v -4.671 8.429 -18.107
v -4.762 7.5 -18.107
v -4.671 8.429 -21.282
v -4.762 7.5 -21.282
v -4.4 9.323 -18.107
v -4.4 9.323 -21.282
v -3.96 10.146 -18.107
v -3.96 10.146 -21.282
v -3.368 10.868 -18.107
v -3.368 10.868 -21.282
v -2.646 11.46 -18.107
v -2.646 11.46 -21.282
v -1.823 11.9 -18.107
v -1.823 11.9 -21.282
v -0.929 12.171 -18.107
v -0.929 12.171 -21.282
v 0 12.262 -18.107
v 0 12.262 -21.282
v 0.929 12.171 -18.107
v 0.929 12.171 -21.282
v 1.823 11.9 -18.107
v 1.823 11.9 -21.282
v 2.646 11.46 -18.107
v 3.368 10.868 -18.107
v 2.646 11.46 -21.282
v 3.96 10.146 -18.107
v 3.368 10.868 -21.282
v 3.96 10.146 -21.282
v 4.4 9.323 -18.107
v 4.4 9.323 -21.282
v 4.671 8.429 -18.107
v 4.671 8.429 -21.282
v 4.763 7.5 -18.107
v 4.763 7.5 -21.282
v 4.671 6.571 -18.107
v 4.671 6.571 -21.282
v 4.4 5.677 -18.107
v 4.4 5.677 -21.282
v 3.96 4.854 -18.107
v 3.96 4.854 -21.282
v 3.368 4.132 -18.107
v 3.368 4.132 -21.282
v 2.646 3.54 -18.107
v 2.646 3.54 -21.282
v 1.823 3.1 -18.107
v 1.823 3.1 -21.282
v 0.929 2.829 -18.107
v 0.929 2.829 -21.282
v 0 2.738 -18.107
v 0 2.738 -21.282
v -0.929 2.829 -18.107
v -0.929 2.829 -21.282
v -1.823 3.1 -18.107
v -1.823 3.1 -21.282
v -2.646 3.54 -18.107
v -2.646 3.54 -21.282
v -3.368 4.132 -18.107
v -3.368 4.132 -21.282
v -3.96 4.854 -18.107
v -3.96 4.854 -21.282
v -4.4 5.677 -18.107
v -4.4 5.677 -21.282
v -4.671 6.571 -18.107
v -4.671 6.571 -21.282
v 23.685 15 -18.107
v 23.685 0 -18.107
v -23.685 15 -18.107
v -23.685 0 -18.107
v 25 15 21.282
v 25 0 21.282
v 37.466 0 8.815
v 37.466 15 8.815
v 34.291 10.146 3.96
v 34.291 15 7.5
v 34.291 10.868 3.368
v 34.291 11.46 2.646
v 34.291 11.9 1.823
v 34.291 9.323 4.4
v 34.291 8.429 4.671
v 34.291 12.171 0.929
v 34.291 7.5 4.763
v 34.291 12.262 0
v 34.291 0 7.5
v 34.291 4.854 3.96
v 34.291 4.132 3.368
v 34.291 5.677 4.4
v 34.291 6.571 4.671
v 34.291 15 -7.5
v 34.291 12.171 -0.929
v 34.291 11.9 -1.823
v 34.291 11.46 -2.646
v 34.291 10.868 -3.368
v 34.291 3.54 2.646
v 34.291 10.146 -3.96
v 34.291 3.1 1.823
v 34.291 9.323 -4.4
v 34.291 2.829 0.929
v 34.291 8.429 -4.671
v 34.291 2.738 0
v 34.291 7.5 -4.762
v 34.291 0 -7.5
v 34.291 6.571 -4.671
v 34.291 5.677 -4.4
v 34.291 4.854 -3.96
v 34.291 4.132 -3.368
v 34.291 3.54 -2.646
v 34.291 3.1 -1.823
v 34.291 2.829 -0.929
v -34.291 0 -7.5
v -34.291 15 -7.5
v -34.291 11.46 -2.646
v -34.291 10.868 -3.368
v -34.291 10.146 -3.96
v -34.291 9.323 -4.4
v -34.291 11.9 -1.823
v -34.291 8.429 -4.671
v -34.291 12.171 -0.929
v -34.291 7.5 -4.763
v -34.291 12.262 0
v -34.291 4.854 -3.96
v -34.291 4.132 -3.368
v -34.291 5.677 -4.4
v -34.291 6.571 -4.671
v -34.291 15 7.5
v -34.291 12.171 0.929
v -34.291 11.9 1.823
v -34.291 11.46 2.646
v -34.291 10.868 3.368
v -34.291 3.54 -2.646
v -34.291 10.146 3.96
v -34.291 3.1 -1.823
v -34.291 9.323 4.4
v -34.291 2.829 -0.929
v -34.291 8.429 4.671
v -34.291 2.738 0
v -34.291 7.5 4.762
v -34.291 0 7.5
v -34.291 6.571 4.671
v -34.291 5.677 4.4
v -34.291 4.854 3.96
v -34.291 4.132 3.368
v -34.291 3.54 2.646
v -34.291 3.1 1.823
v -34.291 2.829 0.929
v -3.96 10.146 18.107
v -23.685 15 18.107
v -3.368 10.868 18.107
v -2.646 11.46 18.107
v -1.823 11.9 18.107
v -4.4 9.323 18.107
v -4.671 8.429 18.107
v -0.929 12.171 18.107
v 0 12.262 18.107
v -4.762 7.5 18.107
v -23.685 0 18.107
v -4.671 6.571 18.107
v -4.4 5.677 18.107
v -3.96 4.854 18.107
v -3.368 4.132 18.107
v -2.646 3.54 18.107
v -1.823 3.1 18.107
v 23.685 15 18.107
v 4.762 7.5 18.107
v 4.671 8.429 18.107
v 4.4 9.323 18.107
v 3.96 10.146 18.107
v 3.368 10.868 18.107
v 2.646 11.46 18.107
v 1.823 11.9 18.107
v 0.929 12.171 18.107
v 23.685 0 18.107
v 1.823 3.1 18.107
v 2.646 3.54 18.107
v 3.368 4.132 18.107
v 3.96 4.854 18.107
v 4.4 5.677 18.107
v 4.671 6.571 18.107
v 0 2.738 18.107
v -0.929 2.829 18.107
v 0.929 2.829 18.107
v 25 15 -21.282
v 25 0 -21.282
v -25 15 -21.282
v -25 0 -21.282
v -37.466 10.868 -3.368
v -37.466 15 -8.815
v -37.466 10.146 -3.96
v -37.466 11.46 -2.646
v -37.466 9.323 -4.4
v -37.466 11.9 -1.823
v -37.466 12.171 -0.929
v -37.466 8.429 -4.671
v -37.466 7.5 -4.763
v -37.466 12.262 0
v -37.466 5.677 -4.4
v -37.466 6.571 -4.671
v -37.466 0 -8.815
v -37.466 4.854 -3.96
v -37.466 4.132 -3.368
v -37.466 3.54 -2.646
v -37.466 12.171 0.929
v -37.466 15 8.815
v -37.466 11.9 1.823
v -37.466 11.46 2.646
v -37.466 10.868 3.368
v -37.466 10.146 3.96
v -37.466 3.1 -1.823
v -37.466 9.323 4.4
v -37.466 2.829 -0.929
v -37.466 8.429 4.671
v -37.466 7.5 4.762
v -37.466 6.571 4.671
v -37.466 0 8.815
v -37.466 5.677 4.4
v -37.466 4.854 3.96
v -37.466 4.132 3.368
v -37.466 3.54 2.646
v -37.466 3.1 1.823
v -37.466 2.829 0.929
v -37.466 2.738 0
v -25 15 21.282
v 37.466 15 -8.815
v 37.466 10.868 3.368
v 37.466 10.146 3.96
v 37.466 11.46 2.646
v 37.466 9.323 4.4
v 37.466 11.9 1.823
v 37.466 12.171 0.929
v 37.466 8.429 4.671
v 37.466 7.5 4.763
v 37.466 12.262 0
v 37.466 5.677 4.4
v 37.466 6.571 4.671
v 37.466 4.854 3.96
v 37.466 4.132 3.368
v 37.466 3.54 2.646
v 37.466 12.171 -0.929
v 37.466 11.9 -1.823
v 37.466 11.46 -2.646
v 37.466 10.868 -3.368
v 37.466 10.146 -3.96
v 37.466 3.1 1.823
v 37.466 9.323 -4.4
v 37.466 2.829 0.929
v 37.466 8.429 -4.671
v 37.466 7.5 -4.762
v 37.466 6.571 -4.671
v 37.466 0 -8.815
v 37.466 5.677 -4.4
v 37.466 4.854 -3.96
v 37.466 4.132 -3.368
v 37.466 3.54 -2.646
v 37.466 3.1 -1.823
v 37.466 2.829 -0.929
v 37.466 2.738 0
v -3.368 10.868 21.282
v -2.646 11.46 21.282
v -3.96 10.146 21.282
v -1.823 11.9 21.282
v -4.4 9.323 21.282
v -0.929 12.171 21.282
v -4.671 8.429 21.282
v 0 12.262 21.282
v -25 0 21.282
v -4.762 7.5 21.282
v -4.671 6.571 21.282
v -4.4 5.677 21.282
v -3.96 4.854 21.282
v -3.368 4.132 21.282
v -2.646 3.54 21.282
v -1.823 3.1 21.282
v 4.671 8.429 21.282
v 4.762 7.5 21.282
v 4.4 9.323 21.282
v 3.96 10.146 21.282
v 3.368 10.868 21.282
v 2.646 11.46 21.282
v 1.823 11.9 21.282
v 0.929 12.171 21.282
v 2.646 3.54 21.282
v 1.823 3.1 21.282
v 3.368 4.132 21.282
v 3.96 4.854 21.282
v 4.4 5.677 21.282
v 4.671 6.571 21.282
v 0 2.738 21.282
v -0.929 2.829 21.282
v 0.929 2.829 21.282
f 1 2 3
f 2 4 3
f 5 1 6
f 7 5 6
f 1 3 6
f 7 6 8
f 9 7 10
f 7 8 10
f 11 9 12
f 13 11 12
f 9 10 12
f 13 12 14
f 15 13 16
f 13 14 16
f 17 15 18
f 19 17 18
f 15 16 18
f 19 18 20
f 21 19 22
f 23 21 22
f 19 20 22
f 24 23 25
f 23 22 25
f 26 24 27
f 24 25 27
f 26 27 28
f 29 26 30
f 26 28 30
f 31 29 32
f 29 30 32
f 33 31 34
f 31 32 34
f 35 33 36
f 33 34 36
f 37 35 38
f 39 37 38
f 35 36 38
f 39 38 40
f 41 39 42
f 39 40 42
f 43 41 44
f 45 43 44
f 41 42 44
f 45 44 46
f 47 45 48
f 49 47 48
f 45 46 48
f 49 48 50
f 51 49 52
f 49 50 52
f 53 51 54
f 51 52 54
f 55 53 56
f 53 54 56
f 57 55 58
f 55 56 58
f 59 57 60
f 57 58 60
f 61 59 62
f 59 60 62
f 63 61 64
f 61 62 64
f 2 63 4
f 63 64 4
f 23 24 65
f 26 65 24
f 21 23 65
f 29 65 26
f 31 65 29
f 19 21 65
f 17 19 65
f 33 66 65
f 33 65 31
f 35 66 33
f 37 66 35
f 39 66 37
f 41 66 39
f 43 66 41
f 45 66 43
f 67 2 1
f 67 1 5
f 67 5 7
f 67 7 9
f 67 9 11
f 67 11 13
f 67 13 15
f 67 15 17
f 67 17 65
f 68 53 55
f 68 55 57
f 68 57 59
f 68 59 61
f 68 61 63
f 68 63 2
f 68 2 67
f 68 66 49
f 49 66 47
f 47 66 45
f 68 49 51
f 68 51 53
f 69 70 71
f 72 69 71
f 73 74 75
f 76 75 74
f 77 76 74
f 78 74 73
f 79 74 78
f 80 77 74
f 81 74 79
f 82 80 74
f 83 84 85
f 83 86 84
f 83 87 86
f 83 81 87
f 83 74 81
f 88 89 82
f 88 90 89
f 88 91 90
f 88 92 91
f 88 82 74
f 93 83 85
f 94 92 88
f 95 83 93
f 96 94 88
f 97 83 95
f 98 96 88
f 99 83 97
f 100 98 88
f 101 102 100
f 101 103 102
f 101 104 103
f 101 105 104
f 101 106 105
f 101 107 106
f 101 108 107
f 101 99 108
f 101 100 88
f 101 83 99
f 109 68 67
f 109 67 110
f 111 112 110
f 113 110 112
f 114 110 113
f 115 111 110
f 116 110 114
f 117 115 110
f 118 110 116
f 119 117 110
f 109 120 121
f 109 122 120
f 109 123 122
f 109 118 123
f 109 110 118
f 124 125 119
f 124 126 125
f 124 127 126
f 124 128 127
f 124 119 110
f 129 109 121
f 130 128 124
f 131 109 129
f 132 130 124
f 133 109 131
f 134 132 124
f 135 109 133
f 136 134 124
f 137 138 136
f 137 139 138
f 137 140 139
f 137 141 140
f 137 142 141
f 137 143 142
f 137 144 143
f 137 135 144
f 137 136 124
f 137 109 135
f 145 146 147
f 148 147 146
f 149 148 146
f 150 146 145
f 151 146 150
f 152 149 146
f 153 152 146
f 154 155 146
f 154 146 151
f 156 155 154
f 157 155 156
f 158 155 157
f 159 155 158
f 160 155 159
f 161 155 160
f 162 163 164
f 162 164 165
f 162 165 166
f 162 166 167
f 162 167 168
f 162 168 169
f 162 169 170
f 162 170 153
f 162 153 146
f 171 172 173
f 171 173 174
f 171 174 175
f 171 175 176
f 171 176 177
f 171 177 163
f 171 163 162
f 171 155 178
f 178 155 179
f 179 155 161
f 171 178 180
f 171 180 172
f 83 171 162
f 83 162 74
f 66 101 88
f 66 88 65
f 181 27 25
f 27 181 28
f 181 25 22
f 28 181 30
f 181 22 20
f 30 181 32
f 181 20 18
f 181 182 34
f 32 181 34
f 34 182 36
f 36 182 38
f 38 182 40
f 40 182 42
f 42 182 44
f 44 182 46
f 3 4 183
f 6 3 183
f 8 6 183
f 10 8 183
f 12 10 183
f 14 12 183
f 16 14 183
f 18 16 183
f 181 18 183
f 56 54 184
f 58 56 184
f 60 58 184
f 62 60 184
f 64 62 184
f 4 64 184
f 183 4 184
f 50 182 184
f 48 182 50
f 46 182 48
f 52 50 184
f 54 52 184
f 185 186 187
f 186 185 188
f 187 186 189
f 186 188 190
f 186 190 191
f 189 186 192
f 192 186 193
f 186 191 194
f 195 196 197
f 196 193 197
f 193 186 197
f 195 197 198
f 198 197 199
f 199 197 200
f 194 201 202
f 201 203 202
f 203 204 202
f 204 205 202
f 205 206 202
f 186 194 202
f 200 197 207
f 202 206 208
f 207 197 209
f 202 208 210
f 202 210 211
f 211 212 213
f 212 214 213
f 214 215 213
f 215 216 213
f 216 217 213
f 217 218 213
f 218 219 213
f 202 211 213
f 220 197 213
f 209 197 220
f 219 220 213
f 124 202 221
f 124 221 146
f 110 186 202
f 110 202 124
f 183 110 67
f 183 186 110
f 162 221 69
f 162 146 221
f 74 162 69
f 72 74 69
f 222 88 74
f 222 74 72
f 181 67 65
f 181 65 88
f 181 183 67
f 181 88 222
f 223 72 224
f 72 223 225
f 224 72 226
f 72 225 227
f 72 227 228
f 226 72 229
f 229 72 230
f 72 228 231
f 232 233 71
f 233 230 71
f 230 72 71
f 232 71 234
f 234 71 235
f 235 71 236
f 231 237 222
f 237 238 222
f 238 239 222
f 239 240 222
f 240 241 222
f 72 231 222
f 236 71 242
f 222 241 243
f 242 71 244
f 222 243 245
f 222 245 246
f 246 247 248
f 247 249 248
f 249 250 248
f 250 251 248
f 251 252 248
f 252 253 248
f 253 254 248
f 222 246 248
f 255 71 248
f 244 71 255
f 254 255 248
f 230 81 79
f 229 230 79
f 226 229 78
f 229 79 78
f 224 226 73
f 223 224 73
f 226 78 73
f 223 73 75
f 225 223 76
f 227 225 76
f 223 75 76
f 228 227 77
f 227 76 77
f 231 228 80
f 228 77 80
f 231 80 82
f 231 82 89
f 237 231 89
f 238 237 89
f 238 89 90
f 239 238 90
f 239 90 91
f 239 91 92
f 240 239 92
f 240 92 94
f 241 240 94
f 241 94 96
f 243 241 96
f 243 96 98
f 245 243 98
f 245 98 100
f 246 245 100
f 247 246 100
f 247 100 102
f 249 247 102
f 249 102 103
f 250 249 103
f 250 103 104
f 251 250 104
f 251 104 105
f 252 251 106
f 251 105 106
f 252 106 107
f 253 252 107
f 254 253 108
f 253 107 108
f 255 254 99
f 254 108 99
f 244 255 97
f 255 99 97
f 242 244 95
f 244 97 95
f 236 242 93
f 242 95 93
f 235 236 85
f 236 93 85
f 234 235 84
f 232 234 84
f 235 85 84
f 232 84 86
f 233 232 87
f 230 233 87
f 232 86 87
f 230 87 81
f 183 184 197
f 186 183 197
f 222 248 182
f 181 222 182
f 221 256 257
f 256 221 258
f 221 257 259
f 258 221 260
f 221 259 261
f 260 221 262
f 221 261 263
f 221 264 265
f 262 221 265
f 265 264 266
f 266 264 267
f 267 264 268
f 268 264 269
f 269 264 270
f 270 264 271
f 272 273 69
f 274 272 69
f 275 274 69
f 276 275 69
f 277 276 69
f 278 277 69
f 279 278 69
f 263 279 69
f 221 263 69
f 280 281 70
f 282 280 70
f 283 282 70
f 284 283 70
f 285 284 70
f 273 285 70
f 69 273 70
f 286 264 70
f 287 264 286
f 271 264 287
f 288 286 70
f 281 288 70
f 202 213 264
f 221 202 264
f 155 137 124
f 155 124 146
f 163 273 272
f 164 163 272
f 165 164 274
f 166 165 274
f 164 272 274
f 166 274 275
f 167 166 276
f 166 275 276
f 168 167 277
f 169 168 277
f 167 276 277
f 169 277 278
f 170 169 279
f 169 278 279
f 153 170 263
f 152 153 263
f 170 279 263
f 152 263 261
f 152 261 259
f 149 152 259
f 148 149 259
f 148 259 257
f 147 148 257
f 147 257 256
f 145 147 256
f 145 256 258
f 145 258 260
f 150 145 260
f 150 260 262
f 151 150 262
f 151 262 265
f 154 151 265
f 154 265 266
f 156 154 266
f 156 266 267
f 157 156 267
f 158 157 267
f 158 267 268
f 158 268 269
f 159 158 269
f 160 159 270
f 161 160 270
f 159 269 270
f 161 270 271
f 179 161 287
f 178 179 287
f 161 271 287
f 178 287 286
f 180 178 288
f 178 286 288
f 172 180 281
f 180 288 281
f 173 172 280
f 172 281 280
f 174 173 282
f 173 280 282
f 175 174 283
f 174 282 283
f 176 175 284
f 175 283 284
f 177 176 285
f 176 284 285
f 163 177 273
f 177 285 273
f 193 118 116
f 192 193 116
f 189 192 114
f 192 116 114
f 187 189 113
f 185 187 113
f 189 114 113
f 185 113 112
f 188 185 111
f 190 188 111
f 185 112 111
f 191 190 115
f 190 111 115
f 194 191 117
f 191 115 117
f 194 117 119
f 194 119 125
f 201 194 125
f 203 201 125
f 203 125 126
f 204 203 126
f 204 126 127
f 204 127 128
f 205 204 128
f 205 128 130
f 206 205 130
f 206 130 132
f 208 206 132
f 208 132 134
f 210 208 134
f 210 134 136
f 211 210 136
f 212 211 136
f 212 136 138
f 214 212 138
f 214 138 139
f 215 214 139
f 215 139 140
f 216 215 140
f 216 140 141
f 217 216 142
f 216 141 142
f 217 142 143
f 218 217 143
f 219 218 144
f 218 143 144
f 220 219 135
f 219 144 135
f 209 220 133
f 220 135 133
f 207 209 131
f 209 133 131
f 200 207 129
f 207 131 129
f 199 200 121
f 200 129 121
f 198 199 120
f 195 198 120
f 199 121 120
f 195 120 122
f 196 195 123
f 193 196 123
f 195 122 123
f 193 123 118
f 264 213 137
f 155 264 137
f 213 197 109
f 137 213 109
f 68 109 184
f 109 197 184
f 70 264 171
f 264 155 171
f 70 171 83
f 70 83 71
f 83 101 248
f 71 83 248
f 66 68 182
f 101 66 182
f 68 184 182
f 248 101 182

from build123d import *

# Parameters (mm, degrees)
BOSS_EXTRUDE2_DEPTH = 15
CUT_EXTRUDE2_REACH  = 60.655
SKETCH4_R           = 4.7625
CIRPATTERN2_COUNT   = 4


with BuildPart() as part:
    # Sketch3 → Boss-Extrude2 (new body)
    with BuildSketch(Plane(origin=(0, 0, 0), x_dir=(1, 0, 0), z_dir=(0, 1, 0))):
        Polygon((-25, -21.281601718), (25, -21.281601718), (37.466473657, -8.815128061), (37.466473657, 8.815128061), (25, 21.281601718), (-25, 21.281601718), (-37.466473657, 8.815128061), (-37.466473657, -8.815128061), align=None)
        Polygon((-34.291473657, -7.5), (-23.684871939, -18.106601718), (23.684871939, -18.106601718), (34.291473657, -7.5), (34.291473657, 7.5), (23.684871939, 18.106601718), (-23.684871939, 18.106601718), (-34.291473657, 7.5), align=None, mode=Mode.SUBTRACT)
    extrude(amount=BOSS_EXTRUDE2_DEPTH)

    # Sketch4 → Cut-Extrude2 (cut, up to next)
    with BuildSketch(Plane.XY.offset(21.281601718), mode=Mode.PRIVATE) as cut_extrude2_sk1:
        with Locations((0, 7.5)):
            Circle(SKETCH4_R)
    cut_extrude2_tool1 = extrude(cut_extrude2_sk1.sketch, amount=-CUT_EXTRUDE2_REACH, mode=Mode.PRIVATE) & part.part
    cut_extrude2 = cut_extrude2_tool1.solids().sort_by_distance((0, 7.5, 21.281602))[0]
    add(cut_extrude2, mode=Mode.SUBTRACT)

    # CirPattern2: Cut-Extrude2; each copy of Cut-Extrude2 runs up to whatever stops it at its own place
    cirpattern2_before = part.part  # the part as the pattern finds it: every copy runs up to it
    cirpattern2_cut_extrude2_long = extrude(cut_extrude2_sk1.sketch, amount=-CUT_EXTRUDE2_REACH, mode=Mode.PRIVATE)
    cirpattern2_cut_extrude2_tool1 = cirpattern2_cut_extrude2_long.rotate(Axis((0, 0, 0), (0, 1, 0)), 1 * 360 / CIRPATTERN2_COUNT) & cirpattern2_before
    add(cirpattern2_cut_extrude2_tool1.solids().sort_by_distance((21.281602, 7.5, 0))[0], mode=Mode.SUBTRACT)
    cirpattern2_cut_extrude2_tool2 = cirpattern2_cut_extrude2_long.rotate(Axis((0, 0, 0), (0, 1, 0)), 2 * 360 / CIRPATTERN2_COUNT) & cirpattern2_before
    add(cirpattern2_cut_extrude2_tool2.solids().sort_by_distance((0, 7.5, -21.281602))[0], mode=Mode.SUBTRACT)
    cirpattern2_cut_extrude2_tool3 = cirpattern2_cut_extrude2_long.rotate(Axis((0, 0, 0), (0, 1, 0)), 3 * 360 / CIRPATTERN2_COUNT) & cirpattern2_before
    add(cirpattern2_cut_extrude2_tool3.solids().sort_by_distance((-21.281602, 7.5, 0))[0], mode=Mode.SUBTRACT)


solid = part.part
